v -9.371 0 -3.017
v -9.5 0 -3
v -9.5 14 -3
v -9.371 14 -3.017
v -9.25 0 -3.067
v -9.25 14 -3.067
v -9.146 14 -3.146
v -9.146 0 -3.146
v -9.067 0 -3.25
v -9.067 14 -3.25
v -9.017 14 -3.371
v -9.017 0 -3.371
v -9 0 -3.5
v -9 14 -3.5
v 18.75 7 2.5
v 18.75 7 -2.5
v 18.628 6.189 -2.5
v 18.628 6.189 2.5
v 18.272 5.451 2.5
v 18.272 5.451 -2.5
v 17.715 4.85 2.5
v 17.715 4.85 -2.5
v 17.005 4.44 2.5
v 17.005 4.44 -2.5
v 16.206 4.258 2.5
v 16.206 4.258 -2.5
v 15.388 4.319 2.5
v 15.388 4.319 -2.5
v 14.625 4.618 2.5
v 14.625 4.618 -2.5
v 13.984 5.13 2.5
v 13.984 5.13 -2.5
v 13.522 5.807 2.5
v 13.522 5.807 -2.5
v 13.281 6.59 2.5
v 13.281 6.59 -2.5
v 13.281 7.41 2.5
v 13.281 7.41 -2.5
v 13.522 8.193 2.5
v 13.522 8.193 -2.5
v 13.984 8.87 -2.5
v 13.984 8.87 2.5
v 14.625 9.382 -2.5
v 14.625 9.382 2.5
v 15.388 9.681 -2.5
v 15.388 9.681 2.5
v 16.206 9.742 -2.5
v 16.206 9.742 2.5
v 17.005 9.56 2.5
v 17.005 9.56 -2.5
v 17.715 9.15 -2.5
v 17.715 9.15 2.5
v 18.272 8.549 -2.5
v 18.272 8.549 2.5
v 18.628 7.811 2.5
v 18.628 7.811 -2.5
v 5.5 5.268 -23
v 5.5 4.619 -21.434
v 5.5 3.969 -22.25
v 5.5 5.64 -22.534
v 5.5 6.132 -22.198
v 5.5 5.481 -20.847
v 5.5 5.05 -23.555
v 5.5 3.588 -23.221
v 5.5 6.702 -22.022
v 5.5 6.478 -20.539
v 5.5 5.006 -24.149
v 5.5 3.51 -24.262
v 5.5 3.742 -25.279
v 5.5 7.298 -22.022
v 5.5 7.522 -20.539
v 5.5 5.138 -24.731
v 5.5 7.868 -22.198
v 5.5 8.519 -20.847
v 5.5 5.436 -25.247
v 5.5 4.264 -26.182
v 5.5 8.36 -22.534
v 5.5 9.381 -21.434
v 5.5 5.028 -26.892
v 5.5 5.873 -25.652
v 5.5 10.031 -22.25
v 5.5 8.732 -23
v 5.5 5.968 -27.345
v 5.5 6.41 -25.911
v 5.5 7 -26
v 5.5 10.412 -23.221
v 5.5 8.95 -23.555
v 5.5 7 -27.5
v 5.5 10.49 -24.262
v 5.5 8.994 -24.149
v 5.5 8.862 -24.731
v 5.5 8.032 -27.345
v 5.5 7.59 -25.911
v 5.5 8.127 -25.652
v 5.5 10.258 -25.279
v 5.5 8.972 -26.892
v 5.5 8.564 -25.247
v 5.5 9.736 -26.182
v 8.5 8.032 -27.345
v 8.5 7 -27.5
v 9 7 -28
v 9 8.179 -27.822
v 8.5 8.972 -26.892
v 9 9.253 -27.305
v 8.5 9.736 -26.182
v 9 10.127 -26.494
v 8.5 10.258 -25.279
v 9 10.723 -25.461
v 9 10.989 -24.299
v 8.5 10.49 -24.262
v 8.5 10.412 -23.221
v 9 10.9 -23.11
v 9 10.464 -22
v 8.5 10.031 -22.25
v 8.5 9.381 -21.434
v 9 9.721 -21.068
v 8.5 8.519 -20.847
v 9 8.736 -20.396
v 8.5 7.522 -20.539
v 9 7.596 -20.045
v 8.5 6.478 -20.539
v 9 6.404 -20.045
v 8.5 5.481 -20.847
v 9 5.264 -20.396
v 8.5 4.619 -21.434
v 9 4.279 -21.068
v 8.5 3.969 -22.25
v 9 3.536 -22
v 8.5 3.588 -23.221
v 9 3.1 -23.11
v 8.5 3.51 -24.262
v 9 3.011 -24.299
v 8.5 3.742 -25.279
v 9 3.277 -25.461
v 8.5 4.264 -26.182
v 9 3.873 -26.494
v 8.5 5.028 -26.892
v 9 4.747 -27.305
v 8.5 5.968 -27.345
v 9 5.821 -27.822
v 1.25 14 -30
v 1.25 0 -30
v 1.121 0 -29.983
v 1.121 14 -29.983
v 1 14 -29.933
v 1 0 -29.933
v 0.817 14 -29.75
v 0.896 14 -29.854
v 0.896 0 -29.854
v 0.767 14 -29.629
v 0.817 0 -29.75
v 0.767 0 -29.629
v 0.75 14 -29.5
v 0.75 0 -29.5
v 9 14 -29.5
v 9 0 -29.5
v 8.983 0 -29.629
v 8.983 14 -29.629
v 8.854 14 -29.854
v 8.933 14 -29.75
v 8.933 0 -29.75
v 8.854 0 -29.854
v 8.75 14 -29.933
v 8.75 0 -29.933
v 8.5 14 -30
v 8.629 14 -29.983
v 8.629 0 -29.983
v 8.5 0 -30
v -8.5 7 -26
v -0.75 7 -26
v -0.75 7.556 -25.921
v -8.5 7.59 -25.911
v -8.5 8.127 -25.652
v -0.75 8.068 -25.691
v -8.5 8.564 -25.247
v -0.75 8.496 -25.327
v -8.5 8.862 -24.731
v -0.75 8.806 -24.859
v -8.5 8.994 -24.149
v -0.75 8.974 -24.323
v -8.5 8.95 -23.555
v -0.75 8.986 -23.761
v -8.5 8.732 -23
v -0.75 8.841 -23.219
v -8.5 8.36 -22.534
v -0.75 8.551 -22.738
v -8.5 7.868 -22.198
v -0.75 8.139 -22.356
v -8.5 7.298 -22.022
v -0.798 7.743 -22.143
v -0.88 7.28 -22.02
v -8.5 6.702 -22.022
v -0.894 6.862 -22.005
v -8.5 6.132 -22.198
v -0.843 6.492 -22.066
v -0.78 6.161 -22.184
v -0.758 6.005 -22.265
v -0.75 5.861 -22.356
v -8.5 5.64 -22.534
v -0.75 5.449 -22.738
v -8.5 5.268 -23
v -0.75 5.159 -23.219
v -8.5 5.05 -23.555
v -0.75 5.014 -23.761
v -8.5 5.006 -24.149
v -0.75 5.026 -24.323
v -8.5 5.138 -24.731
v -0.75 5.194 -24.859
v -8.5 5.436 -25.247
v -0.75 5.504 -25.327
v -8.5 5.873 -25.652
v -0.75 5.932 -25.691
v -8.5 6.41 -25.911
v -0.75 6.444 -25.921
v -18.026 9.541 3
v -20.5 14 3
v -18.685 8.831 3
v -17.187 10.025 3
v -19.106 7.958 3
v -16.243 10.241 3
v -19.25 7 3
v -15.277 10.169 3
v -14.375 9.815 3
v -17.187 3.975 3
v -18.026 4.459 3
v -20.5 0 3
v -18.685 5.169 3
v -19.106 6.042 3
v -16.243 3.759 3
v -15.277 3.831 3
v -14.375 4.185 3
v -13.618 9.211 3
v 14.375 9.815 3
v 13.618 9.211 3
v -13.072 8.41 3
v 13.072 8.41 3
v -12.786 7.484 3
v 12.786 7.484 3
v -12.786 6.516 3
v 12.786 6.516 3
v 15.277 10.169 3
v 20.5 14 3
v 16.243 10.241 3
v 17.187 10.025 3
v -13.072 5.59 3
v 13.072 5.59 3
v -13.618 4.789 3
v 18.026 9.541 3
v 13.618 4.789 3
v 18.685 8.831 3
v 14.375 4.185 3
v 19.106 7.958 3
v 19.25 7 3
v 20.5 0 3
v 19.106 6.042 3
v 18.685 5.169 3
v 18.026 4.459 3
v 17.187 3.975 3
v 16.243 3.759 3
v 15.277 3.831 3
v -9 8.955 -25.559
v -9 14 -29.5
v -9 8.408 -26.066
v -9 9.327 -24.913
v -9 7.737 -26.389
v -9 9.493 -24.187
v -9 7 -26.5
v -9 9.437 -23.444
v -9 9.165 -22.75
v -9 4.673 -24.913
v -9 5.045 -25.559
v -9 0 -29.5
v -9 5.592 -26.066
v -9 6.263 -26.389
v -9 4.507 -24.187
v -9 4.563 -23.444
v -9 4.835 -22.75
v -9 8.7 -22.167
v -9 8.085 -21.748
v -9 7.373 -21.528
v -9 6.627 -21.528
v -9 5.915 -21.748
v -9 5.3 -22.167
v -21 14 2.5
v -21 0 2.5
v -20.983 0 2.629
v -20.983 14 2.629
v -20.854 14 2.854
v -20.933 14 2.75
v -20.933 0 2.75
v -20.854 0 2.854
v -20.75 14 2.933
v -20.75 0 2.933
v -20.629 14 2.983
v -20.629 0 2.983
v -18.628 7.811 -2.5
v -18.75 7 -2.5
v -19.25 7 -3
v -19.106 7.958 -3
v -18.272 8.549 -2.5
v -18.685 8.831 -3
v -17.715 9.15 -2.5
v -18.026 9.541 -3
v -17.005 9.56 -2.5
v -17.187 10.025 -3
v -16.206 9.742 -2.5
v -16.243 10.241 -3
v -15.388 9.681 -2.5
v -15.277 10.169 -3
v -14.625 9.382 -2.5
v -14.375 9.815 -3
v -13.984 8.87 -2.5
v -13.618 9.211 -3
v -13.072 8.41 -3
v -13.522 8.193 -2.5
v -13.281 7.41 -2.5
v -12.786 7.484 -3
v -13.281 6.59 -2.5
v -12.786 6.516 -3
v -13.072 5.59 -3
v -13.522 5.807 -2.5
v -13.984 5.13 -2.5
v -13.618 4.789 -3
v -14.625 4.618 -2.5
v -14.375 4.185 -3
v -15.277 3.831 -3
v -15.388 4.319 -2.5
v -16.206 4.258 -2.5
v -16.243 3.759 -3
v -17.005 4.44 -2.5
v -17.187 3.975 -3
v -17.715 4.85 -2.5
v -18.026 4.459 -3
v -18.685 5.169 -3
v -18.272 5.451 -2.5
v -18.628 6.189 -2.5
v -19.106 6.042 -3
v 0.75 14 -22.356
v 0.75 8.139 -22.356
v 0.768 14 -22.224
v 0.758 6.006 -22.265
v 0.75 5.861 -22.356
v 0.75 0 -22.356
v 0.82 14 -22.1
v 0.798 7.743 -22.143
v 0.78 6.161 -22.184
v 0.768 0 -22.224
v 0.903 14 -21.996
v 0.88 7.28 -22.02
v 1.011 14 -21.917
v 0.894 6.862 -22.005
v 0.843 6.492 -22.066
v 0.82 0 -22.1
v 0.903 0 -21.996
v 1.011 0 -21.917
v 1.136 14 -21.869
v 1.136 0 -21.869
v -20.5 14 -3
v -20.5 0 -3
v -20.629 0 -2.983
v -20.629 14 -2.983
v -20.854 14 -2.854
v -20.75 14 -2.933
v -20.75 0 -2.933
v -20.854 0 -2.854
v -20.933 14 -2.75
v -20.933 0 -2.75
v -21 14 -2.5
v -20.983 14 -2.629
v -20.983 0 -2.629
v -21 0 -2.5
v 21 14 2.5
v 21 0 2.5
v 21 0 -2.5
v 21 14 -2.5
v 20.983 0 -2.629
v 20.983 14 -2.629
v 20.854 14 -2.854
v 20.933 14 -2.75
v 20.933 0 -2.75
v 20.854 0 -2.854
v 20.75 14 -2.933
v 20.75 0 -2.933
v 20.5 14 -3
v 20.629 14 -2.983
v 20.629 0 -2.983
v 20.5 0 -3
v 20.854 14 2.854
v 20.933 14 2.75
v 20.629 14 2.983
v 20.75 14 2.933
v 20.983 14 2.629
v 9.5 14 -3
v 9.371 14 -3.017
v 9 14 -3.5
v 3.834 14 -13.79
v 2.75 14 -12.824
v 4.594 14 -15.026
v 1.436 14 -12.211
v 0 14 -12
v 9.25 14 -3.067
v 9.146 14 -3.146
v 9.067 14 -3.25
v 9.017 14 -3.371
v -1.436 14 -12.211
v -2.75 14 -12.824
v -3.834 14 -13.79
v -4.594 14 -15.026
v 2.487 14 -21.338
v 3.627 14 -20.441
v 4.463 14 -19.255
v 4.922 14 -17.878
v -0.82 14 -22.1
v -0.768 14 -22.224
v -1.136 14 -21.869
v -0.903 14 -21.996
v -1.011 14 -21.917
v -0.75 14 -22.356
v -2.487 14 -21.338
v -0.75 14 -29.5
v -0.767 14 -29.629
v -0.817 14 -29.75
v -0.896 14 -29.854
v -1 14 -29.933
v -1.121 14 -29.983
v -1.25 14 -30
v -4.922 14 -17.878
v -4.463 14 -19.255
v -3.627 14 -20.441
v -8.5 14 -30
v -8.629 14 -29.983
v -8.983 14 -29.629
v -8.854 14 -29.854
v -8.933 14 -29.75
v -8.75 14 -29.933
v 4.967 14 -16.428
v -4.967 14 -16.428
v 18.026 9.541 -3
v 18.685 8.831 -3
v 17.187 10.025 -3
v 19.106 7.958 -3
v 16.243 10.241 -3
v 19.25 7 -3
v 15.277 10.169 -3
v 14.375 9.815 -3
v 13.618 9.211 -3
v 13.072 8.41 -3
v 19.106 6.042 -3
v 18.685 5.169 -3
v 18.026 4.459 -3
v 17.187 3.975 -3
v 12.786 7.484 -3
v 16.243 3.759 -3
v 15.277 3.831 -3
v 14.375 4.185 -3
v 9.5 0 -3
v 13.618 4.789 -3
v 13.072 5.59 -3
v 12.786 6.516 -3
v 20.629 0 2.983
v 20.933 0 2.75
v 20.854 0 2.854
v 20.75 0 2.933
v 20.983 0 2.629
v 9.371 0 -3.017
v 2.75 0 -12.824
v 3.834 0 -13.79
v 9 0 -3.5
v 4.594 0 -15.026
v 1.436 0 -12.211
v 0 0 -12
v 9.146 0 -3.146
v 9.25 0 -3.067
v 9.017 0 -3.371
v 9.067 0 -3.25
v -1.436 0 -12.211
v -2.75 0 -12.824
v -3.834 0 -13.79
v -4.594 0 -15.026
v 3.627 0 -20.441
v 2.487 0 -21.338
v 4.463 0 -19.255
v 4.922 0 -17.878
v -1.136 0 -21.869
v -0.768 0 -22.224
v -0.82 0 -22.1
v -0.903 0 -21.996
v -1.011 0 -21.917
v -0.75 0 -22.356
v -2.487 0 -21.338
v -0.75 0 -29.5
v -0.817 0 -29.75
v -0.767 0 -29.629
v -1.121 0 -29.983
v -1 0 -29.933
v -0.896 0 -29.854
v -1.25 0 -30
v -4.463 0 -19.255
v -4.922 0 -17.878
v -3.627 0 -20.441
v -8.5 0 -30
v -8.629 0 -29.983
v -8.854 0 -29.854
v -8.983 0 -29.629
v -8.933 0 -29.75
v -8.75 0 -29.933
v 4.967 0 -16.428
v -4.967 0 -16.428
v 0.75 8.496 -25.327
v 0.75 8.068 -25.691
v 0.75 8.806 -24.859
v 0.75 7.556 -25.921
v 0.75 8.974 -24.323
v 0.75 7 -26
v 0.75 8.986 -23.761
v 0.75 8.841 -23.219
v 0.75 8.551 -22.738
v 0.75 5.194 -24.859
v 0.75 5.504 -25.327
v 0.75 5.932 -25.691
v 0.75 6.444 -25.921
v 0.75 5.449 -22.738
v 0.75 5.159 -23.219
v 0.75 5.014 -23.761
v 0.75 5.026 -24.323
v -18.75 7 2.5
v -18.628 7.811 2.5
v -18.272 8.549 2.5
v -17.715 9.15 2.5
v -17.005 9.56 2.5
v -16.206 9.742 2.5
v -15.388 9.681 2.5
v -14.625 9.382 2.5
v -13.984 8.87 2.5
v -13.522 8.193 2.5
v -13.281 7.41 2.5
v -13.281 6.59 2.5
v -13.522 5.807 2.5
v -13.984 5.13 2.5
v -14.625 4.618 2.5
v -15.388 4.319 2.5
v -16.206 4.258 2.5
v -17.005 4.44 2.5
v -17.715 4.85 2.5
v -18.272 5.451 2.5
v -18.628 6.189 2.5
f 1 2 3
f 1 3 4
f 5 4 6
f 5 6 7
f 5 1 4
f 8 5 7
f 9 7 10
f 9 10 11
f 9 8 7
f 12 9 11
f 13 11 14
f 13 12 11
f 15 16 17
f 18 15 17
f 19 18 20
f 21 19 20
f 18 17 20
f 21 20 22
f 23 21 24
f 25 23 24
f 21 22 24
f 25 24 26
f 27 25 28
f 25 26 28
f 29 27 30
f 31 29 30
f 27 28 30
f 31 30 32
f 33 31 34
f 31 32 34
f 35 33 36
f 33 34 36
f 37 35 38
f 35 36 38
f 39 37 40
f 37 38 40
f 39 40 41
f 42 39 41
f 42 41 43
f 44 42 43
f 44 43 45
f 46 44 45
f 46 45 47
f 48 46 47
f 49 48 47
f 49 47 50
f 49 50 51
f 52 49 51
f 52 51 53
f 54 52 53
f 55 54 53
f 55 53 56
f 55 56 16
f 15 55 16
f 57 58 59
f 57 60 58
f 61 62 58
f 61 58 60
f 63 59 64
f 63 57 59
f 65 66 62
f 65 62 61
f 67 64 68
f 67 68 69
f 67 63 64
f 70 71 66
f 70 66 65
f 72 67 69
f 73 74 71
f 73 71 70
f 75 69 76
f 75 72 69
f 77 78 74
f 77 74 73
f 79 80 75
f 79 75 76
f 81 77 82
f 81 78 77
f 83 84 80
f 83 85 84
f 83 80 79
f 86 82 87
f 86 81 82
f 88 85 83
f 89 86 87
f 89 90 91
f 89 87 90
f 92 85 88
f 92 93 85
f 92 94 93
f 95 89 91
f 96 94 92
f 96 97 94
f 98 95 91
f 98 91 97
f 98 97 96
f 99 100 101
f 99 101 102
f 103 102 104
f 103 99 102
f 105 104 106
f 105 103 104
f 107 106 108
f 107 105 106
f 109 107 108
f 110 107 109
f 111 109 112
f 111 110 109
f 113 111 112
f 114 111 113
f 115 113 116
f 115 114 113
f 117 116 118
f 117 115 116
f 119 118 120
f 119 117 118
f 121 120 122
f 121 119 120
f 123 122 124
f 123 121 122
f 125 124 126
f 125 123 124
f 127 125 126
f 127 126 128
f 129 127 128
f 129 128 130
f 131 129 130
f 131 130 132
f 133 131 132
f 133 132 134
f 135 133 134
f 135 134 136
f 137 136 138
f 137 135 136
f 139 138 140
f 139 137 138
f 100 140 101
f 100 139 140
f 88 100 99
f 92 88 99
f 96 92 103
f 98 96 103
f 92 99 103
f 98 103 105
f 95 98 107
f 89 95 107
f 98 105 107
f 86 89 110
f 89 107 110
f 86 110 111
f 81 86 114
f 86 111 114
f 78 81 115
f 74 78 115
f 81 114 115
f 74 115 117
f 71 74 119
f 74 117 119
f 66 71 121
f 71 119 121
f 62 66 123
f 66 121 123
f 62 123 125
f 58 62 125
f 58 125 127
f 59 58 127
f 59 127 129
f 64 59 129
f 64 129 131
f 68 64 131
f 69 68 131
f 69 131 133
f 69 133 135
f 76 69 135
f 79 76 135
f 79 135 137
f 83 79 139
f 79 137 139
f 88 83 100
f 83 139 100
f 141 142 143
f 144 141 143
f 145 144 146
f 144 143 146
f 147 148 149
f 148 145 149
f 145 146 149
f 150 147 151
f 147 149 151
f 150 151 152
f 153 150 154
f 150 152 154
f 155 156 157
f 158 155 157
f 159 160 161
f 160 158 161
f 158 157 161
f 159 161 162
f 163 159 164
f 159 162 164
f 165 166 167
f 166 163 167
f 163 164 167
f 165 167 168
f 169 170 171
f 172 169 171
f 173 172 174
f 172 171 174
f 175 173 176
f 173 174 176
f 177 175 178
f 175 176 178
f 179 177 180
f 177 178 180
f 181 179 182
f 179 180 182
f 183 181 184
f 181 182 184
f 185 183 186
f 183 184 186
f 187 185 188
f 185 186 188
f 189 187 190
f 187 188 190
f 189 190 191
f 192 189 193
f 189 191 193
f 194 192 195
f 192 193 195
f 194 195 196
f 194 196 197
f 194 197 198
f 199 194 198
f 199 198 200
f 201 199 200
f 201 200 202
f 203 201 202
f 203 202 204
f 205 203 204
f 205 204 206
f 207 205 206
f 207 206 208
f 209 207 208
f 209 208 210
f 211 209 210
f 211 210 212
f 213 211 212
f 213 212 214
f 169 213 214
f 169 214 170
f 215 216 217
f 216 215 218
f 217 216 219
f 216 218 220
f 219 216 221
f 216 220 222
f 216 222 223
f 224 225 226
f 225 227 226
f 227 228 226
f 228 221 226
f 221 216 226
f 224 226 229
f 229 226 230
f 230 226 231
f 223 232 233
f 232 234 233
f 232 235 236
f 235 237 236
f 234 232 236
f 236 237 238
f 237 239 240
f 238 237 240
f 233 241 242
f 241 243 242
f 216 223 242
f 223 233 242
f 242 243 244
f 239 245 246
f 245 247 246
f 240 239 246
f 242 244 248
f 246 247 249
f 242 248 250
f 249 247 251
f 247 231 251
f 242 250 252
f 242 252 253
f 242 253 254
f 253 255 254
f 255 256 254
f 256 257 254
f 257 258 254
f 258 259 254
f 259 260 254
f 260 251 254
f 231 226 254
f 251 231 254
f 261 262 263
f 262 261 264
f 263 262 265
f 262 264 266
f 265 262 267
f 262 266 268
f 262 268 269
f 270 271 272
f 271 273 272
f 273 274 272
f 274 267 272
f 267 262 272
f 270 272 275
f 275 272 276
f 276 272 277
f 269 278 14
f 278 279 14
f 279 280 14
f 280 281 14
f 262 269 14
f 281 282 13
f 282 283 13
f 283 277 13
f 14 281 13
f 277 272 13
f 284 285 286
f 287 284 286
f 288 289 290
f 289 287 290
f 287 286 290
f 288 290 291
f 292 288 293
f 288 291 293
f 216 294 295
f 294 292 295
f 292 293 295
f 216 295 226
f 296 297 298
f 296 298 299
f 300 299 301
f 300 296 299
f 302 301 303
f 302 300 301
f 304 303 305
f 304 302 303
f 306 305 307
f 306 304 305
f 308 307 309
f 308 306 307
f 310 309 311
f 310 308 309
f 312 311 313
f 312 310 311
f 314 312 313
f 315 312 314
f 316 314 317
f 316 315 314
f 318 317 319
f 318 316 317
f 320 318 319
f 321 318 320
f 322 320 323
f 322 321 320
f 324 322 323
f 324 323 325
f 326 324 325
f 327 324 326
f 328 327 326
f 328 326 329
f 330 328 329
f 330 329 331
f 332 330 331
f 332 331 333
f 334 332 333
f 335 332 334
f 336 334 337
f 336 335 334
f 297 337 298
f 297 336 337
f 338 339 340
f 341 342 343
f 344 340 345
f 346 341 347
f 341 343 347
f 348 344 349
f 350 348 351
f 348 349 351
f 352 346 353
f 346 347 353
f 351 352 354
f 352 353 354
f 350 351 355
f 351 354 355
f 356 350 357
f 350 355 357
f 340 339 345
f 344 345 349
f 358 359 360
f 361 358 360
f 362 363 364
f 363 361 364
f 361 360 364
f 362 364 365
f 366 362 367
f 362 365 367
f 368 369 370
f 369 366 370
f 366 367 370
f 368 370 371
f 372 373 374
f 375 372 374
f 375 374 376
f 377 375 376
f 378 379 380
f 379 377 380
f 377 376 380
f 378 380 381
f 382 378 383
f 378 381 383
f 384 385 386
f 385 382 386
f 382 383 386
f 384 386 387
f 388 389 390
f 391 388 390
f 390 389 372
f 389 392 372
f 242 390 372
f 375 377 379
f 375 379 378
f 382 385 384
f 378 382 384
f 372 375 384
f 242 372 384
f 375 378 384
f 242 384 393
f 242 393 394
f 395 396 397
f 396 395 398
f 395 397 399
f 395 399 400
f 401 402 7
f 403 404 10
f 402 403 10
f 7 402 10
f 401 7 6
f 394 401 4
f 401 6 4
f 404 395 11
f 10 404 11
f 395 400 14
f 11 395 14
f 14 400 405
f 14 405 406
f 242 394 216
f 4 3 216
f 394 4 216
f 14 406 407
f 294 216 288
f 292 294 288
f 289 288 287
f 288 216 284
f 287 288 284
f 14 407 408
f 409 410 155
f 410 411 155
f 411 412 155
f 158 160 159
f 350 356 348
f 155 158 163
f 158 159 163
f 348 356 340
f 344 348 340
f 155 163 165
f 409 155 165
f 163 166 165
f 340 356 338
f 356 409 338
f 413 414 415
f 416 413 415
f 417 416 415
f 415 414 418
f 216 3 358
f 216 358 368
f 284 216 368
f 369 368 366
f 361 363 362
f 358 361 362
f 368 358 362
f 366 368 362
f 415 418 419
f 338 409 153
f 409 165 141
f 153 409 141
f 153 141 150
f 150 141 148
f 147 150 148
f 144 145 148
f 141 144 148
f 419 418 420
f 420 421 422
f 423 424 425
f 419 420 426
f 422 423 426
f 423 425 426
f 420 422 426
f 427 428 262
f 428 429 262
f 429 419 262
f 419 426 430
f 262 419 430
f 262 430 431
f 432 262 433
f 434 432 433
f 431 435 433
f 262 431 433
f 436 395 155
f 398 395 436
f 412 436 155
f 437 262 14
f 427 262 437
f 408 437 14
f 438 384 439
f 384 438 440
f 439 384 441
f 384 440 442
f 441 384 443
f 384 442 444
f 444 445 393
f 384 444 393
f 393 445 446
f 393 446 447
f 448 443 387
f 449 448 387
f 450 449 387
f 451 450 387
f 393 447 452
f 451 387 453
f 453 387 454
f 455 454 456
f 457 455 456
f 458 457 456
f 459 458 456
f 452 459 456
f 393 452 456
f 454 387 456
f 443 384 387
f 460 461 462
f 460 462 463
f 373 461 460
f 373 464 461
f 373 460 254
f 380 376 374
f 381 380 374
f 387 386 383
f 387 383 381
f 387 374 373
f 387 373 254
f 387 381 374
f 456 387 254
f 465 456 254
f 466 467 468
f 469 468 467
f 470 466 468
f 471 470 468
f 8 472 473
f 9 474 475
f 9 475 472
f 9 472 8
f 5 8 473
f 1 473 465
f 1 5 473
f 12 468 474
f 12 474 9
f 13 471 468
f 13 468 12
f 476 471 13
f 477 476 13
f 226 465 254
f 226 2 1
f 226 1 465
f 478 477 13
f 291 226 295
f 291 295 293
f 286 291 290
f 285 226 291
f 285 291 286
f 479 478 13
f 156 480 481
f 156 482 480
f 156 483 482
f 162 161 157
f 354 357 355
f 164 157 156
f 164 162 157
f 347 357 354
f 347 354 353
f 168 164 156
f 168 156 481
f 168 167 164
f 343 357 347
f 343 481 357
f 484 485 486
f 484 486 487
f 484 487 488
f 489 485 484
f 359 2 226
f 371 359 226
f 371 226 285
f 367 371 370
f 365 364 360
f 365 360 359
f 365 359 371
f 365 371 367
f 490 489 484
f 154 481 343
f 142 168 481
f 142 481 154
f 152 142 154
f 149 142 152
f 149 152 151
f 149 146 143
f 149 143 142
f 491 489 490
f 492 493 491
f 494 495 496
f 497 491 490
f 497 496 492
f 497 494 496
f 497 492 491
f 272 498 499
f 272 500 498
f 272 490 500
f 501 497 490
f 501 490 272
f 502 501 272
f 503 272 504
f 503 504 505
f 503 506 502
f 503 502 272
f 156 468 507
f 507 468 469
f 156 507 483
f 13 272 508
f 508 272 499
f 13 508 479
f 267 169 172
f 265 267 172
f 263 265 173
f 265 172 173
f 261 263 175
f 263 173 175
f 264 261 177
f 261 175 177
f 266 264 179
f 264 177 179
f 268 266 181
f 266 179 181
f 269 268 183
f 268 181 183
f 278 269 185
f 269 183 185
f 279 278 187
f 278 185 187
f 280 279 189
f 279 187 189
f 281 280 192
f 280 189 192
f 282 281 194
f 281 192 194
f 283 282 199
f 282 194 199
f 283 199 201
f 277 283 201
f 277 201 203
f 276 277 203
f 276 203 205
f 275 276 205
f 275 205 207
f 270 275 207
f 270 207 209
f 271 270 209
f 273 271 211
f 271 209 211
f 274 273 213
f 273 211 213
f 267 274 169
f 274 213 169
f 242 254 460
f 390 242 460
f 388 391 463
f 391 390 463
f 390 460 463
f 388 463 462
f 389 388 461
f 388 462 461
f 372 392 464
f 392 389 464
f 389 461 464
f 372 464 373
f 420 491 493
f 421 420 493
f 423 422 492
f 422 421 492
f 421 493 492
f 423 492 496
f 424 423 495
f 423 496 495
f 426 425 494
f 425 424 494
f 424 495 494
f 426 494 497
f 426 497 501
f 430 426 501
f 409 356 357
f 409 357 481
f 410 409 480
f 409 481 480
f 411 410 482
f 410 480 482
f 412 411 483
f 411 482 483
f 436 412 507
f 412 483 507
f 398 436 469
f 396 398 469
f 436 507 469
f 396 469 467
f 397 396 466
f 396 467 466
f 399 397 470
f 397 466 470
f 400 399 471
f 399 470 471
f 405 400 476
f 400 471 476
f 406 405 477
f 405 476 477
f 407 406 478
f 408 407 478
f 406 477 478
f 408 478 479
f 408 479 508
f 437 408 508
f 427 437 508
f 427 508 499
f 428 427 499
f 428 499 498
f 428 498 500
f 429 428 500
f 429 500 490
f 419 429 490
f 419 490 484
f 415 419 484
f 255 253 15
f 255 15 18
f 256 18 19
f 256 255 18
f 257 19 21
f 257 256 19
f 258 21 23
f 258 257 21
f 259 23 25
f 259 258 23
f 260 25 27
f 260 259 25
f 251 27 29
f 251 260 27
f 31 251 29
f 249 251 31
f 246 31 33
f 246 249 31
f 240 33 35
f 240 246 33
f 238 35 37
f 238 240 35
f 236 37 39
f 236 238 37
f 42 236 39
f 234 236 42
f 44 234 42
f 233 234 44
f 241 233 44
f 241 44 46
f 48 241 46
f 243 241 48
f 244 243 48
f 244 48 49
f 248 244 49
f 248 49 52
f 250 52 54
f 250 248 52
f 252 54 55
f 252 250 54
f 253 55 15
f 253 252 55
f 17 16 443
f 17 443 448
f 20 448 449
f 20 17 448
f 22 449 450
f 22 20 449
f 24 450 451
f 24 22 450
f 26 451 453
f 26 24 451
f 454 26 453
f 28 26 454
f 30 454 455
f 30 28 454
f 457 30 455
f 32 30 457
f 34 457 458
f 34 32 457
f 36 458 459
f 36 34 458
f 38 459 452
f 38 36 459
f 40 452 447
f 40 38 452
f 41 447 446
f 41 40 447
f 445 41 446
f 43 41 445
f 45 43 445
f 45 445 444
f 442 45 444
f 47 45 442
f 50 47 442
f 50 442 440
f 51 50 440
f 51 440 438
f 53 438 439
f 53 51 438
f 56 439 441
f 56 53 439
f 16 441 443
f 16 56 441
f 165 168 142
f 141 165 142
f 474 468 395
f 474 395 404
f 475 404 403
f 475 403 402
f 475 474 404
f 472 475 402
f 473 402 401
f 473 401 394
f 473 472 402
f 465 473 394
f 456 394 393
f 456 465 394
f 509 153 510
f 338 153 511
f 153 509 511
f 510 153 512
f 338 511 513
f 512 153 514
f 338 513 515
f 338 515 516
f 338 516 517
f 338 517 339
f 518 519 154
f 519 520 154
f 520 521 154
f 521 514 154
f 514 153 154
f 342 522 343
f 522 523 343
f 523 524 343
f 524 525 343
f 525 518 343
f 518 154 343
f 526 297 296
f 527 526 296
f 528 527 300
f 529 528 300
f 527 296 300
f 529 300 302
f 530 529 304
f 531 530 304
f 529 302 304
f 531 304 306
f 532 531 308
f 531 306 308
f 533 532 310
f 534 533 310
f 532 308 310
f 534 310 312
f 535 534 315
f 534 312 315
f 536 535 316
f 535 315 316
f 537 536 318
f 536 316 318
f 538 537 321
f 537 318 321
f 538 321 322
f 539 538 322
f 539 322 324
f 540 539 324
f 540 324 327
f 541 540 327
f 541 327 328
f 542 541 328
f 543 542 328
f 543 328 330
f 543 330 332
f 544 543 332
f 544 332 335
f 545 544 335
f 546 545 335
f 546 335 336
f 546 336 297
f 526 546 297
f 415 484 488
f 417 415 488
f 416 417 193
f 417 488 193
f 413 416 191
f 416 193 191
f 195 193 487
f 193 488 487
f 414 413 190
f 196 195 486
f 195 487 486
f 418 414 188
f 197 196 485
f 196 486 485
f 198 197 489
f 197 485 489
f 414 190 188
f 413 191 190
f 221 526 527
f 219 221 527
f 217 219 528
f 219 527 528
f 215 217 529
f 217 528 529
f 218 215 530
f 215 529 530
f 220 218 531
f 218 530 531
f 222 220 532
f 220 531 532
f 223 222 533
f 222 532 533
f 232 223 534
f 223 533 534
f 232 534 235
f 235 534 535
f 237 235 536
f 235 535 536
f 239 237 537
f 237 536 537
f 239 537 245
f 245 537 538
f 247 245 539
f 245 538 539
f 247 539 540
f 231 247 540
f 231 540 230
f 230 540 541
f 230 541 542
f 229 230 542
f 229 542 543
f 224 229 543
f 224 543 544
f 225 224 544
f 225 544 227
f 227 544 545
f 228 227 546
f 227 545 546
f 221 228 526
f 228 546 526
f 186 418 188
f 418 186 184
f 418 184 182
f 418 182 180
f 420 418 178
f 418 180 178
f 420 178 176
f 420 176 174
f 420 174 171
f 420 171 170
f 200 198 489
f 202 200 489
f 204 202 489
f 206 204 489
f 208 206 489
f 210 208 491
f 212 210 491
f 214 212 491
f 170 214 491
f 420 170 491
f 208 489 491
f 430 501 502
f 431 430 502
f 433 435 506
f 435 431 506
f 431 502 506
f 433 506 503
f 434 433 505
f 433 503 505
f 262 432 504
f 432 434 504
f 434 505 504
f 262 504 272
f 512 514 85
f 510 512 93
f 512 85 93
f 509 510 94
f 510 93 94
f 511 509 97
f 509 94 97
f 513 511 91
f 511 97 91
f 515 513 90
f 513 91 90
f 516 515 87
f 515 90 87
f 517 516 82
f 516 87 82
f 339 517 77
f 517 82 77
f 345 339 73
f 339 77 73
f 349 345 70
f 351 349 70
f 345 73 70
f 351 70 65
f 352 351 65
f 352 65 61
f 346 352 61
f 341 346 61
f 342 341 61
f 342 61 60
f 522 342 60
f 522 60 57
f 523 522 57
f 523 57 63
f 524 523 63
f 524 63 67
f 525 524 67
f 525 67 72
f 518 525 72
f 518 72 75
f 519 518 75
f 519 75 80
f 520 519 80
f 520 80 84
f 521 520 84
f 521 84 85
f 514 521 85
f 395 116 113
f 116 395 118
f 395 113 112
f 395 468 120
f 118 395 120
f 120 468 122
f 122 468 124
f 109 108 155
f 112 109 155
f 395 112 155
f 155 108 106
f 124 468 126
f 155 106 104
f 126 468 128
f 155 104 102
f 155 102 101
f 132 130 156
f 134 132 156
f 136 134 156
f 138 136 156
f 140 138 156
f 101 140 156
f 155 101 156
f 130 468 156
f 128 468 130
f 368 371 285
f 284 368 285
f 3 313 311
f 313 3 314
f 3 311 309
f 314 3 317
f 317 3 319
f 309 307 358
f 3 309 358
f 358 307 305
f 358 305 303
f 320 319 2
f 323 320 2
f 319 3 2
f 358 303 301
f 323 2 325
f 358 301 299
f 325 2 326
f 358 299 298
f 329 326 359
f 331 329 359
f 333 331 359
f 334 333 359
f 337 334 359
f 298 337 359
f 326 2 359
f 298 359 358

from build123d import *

# Parameters (mm, degrees)
BOSS_EXTRUDE1_DEPTH = 14
SKETCH2_R           = 2.75
CUT_EXTRUDE1_DEPTH  = 14
SKETCH3_R           = 2
CUT_EXTRUDE2_DEPTH  = 45.676615807
SKETCH4_R           = 3.5
CUT_EXTRUDE3_DEPTH  = 3.5
FILLET1_R           = 0.5
CHAMFER1_SIZE       = 0.5


with BuildPart() as part:
    # Sketch1 → Boss-Extrude1 (new body)
    with BuildSketch(Plane(origin=(0, 0, 0), x_dir=(1, 0, 0), z_dir=(0, 1, 0))):
        with BuildLine():
            Line((-21, 3), (-21, -3))
            Line((-21, -3), (21, -3))
            Line((21, -3), (21, 3))
            Line((21, 3), (9, 3))
            Line((9, 3), (9, 30))
            Line((9, 30), (0.75, 30))
            Line((0.75, 30), (0.75, 21.943429983))
            ThreePointArc((0.75, 21.943429983), (0, 12), (-0.75, 21.943429983))
            Line((-0.75, 21.943429983), (-0.75, 30))
            Line((-0.75, 30), (-9, 30))
            Line((-9, 30), (-9, 3))
            Line((-9, 3), (-21, 3))
        make_face()
    extrude(amount=BOSS_EXTRUDE1_DEPTH)

    # Sketch2 → Cut-Extrude1 (cut)
    with BuildSketch(Plane(origin=(0, 0, -3), x_dir=(-1, 0, 0), z_dir=(0, 0, -1))):
        with BuildLine():
            Line((-18.75, 7), (-16, 7))
            Line((-16, 7), (-13.25, 7))
            ThreePointArc((-13.25, 7), (-16, 9.75), (-18.75, 7))
        make_face()
        with BuildLine():
            Line((-13.25, 7), (-16, 7))
            Line((-16, 7), (-18.75, 7))
            ThreePointArc((-18.75, 7), (-16, 4.25), (-13.25, 7))
        make_face()
        with Locations((16, 7)):
            Circle(SKETCH2_R)
    extrude(amount=-CUT_EXTRUDE1_DEPTH, mode=Mode.SUBTRACT)

    # Sketch3 → Cut-Extrude2 (cut, through all)
    with BuildSketch(Plane(origin=(9, 0, 0), x_dir=(0, 0, -1), z_dir=(1, 0, 0))):
        with Locations((24, 7)):
            Circle(SKETCH3_R)
    extrude(amount=-CUT_EXTRUDE2_DEPTH, mode=Mode.SUBTRACT)

    # Sketch4 → Cut-Extrude3 (cut)
    with BuildSketch(Plane(origin=(9, 0, 0), x_dir=(0, 0, -1), z_dir=(1, 0, 0))):
        with Locations((24, 7)):
            Circle(SKETCH4_R)
    extrude(amount=-CUT_EXTRUDE3_DEPTH, mode=Mode.SUBTRACT)

    # Fillet1
    # the kernel refuses this fillet: 0.5 mm, written as the material it adds along each edge
    with BuildSketch(Plane(origin=(9, 0, -3), x_dir=(1, 0, 0), z_dir=(0, 1, 0)), Plane(origin=(-9, 0, -3), x_dir=(0, 0, -1), z_dir=(0, 1, 0))) as fillet1_piece_1:
        with BuildLine():
            CenterArc((FILLET1_R, FILLET1_R), FILLET1_R, 180, 90)
            Line((0, FILLET1_R), (0, 0))
            Line((0, 0), (FILLET1_R, 0))
        make_face()
    extrude(amount=14)
    # the kernel refuses this fillet: 0.5 mm, written as the material it takes off along each edge
    with BuildSketch(Plane(origin=(0.75, -1.031603345, -21.943429983), x_dir=(0.9820189181944738, 0, 0.18878253178765073), z_dir=(0, 1, 0))) as fillet1_2_piece_1:
        with BuildLine():
            CenterArc((0.413109983, 0.499612866), FILLET1_R, 190.881742673, 76.863441213)
            Line((-0.077899477, 0.4052216), (0, 0))
            ThreePointArc((0, 0), (0.196719039, 0.003871337), (0.393438079, 0))
        make_face()
    extrude(amount=16.06320669, mode=Mode.SUBTRACT)
    with BuildSketch(Plane(origin=(0.75, -1.25, -30), x_dir=(0, 0, 1), z_dir=(0, 1, 0))) as fillet1_2_piece_2:
        with BuildLine():
            CenterArc((FILLET1_R, FILLET1_R), FILLET1_R, 180, 90)
            Line((0, FILLET1_R), (0, 0))
            Line((0, 0), (FILLET1_R, 0))
        make_face()
    extrude(amount=16.5, mode=Mode.SUBTRACT)
    with BuildSketch(Plane(origin=(9, -1.25, -30), x_dir=(0, 0, 1), z_dir=(0, 1, 0)), Plane(origin=(-9, -1.25, -30), x_dir=(1, 0, 0), z_dir=(0, 1, 0)), Plane(origin=(-0.75, -1.25, -30), x_dir=(0, 0, 1), z_dir=(0, 1, 0)), Plane(origin=(21, -1.25, 3), x_dir=(-1, 0, 0), z_dir=(0, 1, 0)), Plane(origin=(21, -1.25, -3), x_dir=(0, 0, 1), z_dir=(0, 1, 0)), Plane(origin=(-21, -1.25, -3), x_dir=(1, 0, 0), z_dir=(0, 1, 0)), Plane(origin=(-21, -1.25, 3), x_dir=(0, 0, -1), z_dir=(0, 1, 0))) as fillet1_2_piece_3:
        with BuildLine():
            CenterArc((FILLET1_R, -FILLET1_R), FILLET1_R, 90, 90)
            Line((0, -FILLET1_R), (0, 0))
            Line((0, 0), (FILLET1_R, 0))
        make_face()
    extrude(amount=16.5, mode=Mode.SUBTRACT)
    with BuildSketch(Plane(origin=(-0.75, -1.031603345, -21.943429983), x_dir=(0, 0, -1), z_dir=(0, 1, 0))) as fillet1_2_piece_4:
        with BuildLine():
            CenterArc((0.412641338, 0.5), FILLET1_R, 193.136558787, 76.863441213)
            ThreePointArc((-0.074274237, 0.386363636), (-0.033335392, 0.193912659), (0, 0))
            Line((0, 0), (0.412641338, 0))
        make_face()
    extrude(amount=16.06320669, mode=Mode.SUBTRACT)

    # Chamfer1
    chamfer1_edges = [part.edges().sort_by_distance(p)[0] for p in [
        (-13.25, 7, 3),
        (-13.25, 7, -3),
        (13.25, 7, 3),
        (13.25, 7, -3),
        (-9, 7, -22),
        (9, 7, -20.5),
    ]]
    chamfer(chamfer1_edges, length=CHAMFER1_SIZE)


solid = part.part
